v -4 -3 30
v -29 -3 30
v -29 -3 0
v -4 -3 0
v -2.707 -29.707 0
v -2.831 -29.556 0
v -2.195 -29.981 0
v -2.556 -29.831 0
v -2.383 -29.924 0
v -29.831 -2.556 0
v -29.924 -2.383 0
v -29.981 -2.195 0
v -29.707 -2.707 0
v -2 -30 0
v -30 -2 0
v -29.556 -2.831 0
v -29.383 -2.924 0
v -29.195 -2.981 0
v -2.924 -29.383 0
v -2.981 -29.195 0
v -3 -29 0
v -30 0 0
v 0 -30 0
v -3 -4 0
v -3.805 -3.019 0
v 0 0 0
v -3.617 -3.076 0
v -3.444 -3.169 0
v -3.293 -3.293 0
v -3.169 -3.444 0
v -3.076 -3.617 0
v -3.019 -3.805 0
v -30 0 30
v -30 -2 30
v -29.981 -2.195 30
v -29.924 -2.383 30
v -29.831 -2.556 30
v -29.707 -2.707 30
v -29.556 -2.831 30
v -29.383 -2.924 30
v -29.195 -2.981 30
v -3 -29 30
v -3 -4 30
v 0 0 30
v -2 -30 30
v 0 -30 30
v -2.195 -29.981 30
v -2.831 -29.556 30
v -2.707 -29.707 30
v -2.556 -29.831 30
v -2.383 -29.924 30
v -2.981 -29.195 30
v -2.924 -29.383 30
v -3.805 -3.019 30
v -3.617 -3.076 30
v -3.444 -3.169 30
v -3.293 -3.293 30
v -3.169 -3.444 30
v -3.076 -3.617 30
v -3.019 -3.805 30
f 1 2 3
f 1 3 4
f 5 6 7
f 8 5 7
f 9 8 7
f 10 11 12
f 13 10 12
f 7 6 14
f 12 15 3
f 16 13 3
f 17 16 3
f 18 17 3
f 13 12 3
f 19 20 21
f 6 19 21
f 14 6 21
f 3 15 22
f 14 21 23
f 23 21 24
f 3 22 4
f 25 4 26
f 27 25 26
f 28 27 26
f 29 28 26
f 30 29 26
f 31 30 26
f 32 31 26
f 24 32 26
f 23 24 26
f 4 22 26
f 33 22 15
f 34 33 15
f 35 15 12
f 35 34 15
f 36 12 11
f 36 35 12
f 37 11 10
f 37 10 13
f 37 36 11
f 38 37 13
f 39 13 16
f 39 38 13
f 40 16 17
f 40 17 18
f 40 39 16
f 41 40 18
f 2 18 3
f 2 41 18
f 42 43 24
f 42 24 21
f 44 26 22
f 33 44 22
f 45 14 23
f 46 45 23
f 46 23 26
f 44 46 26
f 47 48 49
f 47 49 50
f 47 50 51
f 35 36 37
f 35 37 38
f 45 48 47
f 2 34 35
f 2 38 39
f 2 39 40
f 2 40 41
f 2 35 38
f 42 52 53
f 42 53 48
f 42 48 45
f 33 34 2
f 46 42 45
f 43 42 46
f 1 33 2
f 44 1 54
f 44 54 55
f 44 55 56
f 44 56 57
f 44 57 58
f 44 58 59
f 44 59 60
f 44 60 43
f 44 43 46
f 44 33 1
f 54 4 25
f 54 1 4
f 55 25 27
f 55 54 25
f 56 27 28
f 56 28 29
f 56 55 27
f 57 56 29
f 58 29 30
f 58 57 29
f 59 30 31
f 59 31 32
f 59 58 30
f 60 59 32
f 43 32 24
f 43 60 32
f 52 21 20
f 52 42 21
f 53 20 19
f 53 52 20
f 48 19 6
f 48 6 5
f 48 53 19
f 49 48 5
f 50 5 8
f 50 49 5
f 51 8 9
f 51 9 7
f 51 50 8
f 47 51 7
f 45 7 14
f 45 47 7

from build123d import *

# Parameters (mm, degrees)
EXTRUDE1_DEPTH = 30
FILLET1_R      = 1


with BuildPart() as part:
    # Sketch1 → Extrude1 (new body)
    with BuildSketch(Plane.XY):
        Polygon((0, 0), (-30, 0), (-30, -3), (-3, -3), (-3, -30), (0, -30), align=None)
    extrude(amount=EXTRUDE1_DEPTH)

    # Fillet1
    fillet1_edges = [part.edges().sort_by_distance(p)[0] for p in [
        (-3, -30, 15),
        (-3, -3, 15),
        (-30, -3, 15),
    ]]
    fillet(fillet1_edges, radius=FILLET1_R)


solid = part.part
